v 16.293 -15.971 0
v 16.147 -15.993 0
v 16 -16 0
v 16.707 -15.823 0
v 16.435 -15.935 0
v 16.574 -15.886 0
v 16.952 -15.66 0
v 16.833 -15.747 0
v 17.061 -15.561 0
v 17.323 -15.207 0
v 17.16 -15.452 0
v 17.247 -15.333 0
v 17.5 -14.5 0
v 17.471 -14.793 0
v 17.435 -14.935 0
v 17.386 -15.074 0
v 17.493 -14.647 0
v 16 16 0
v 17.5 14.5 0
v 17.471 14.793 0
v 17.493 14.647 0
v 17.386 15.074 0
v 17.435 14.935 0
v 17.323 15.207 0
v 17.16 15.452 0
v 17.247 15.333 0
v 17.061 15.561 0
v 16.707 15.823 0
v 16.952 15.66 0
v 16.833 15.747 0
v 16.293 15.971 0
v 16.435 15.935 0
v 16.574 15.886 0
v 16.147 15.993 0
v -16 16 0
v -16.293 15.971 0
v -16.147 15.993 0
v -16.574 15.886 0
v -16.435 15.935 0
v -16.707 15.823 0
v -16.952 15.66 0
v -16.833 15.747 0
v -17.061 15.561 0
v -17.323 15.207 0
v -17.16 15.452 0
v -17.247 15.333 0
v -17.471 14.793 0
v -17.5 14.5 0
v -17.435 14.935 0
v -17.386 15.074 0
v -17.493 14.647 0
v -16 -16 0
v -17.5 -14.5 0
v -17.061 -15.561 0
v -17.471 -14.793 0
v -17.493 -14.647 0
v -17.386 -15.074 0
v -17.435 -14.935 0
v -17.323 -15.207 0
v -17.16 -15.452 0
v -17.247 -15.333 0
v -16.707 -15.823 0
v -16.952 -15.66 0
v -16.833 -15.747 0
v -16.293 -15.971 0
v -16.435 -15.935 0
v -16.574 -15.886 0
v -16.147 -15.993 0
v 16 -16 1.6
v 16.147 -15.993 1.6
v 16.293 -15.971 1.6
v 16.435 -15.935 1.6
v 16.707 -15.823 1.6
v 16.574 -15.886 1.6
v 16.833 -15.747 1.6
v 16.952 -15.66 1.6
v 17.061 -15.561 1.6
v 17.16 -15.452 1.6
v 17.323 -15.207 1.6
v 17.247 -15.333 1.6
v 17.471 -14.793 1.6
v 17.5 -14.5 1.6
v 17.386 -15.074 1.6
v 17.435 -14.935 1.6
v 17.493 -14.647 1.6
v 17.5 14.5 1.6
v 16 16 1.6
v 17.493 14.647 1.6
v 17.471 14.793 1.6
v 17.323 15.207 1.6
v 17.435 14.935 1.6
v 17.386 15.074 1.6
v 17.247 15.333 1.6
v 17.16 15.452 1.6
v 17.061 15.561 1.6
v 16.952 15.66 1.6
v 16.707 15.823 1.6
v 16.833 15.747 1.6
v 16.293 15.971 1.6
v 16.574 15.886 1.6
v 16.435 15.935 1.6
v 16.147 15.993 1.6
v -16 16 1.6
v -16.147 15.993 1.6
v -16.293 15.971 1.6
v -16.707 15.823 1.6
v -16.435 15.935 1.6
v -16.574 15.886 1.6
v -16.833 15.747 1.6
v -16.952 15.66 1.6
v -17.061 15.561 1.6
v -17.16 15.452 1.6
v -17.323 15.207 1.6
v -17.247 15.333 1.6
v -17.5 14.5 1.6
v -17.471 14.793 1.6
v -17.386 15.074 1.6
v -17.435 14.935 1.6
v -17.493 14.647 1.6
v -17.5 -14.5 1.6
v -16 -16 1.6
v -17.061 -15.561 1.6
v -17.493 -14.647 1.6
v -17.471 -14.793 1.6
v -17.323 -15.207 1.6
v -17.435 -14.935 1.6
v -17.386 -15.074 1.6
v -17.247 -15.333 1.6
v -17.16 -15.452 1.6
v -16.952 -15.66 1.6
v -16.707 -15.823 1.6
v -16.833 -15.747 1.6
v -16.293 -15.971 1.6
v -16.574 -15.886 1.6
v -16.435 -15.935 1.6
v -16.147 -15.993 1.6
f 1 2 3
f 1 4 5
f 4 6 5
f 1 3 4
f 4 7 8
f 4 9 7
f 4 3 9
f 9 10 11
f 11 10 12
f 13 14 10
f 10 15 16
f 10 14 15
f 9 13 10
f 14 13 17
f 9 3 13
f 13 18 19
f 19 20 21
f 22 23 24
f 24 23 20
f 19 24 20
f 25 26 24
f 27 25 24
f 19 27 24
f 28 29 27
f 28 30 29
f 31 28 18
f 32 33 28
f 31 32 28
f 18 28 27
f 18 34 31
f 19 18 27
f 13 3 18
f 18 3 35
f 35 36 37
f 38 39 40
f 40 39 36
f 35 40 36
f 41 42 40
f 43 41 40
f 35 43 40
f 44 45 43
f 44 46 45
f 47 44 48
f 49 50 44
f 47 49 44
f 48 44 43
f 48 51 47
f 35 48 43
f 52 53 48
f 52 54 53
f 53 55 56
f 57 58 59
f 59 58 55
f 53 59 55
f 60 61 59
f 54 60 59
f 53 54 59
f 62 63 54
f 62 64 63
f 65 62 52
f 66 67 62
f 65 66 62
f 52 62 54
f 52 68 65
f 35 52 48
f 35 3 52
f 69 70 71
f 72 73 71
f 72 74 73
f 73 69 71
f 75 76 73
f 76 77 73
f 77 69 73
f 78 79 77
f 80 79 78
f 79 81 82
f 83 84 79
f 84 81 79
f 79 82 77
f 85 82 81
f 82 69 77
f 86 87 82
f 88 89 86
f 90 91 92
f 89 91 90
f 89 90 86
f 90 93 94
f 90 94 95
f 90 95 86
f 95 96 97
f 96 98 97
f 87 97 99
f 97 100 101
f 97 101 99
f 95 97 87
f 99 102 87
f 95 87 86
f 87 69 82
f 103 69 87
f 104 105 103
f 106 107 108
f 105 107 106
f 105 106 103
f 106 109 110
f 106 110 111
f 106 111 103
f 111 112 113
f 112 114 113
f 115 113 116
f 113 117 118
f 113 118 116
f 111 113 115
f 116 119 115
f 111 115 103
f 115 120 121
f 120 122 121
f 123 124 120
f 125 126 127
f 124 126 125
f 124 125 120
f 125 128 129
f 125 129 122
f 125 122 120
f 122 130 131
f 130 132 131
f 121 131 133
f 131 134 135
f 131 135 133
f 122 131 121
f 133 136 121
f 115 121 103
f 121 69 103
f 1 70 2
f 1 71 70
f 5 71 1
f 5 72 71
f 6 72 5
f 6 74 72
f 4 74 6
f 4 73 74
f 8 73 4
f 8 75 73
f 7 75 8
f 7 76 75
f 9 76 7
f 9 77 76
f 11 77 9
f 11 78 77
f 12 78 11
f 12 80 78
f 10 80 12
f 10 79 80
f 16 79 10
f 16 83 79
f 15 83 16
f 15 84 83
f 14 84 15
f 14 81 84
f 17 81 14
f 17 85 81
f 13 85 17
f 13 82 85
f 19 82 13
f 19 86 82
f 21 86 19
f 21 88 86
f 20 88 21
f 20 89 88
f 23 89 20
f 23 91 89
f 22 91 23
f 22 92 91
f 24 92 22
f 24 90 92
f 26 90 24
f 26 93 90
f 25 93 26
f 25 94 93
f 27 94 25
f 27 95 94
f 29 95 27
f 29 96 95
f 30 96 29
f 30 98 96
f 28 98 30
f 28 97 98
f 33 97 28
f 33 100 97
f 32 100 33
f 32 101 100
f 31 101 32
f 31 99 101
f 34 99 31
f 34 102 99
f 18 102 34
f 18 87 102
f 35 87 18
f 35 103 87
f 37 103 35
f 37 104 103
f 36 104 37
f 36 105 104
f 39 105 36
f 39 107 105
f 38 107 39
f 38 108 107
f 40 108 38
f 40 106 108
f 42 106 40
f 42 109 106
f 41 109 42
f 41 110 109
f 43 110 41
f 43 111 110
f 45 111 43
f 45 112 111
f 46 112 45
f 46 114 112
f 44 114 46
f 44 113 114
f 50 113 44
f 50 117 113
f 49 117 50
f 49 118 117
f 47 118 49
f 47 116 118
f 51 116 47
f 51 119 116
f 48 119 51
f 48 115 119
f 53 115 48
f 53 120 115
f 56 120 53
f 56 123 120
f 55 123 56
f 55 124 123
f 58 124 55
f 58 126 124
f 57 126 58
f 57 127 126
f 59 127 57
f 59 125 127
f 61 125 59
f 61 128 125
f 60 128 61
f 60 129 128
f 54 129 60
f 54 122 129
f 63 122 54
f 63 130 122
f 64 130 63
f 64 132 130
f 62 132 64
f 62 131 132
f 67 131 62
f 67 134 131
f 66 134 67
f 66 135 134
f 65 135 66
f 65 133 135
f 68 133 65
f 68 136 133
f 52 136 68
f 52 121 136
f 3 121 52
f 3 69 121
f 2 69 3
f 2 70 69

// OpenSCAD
$fn = 64;

module motor_driver_module(length=35.0, width=32.0, thickness=1.6, corner_r=1.5) {
    corner_r = min(corner_r, min(length, width)/2 - 0.01);

    linear_extrude(height=thickness)
        offset(r=corner_r)
            square([length - 2*corner_r, width - 2*corner_r], center=true);
}

motor_driver_module();
